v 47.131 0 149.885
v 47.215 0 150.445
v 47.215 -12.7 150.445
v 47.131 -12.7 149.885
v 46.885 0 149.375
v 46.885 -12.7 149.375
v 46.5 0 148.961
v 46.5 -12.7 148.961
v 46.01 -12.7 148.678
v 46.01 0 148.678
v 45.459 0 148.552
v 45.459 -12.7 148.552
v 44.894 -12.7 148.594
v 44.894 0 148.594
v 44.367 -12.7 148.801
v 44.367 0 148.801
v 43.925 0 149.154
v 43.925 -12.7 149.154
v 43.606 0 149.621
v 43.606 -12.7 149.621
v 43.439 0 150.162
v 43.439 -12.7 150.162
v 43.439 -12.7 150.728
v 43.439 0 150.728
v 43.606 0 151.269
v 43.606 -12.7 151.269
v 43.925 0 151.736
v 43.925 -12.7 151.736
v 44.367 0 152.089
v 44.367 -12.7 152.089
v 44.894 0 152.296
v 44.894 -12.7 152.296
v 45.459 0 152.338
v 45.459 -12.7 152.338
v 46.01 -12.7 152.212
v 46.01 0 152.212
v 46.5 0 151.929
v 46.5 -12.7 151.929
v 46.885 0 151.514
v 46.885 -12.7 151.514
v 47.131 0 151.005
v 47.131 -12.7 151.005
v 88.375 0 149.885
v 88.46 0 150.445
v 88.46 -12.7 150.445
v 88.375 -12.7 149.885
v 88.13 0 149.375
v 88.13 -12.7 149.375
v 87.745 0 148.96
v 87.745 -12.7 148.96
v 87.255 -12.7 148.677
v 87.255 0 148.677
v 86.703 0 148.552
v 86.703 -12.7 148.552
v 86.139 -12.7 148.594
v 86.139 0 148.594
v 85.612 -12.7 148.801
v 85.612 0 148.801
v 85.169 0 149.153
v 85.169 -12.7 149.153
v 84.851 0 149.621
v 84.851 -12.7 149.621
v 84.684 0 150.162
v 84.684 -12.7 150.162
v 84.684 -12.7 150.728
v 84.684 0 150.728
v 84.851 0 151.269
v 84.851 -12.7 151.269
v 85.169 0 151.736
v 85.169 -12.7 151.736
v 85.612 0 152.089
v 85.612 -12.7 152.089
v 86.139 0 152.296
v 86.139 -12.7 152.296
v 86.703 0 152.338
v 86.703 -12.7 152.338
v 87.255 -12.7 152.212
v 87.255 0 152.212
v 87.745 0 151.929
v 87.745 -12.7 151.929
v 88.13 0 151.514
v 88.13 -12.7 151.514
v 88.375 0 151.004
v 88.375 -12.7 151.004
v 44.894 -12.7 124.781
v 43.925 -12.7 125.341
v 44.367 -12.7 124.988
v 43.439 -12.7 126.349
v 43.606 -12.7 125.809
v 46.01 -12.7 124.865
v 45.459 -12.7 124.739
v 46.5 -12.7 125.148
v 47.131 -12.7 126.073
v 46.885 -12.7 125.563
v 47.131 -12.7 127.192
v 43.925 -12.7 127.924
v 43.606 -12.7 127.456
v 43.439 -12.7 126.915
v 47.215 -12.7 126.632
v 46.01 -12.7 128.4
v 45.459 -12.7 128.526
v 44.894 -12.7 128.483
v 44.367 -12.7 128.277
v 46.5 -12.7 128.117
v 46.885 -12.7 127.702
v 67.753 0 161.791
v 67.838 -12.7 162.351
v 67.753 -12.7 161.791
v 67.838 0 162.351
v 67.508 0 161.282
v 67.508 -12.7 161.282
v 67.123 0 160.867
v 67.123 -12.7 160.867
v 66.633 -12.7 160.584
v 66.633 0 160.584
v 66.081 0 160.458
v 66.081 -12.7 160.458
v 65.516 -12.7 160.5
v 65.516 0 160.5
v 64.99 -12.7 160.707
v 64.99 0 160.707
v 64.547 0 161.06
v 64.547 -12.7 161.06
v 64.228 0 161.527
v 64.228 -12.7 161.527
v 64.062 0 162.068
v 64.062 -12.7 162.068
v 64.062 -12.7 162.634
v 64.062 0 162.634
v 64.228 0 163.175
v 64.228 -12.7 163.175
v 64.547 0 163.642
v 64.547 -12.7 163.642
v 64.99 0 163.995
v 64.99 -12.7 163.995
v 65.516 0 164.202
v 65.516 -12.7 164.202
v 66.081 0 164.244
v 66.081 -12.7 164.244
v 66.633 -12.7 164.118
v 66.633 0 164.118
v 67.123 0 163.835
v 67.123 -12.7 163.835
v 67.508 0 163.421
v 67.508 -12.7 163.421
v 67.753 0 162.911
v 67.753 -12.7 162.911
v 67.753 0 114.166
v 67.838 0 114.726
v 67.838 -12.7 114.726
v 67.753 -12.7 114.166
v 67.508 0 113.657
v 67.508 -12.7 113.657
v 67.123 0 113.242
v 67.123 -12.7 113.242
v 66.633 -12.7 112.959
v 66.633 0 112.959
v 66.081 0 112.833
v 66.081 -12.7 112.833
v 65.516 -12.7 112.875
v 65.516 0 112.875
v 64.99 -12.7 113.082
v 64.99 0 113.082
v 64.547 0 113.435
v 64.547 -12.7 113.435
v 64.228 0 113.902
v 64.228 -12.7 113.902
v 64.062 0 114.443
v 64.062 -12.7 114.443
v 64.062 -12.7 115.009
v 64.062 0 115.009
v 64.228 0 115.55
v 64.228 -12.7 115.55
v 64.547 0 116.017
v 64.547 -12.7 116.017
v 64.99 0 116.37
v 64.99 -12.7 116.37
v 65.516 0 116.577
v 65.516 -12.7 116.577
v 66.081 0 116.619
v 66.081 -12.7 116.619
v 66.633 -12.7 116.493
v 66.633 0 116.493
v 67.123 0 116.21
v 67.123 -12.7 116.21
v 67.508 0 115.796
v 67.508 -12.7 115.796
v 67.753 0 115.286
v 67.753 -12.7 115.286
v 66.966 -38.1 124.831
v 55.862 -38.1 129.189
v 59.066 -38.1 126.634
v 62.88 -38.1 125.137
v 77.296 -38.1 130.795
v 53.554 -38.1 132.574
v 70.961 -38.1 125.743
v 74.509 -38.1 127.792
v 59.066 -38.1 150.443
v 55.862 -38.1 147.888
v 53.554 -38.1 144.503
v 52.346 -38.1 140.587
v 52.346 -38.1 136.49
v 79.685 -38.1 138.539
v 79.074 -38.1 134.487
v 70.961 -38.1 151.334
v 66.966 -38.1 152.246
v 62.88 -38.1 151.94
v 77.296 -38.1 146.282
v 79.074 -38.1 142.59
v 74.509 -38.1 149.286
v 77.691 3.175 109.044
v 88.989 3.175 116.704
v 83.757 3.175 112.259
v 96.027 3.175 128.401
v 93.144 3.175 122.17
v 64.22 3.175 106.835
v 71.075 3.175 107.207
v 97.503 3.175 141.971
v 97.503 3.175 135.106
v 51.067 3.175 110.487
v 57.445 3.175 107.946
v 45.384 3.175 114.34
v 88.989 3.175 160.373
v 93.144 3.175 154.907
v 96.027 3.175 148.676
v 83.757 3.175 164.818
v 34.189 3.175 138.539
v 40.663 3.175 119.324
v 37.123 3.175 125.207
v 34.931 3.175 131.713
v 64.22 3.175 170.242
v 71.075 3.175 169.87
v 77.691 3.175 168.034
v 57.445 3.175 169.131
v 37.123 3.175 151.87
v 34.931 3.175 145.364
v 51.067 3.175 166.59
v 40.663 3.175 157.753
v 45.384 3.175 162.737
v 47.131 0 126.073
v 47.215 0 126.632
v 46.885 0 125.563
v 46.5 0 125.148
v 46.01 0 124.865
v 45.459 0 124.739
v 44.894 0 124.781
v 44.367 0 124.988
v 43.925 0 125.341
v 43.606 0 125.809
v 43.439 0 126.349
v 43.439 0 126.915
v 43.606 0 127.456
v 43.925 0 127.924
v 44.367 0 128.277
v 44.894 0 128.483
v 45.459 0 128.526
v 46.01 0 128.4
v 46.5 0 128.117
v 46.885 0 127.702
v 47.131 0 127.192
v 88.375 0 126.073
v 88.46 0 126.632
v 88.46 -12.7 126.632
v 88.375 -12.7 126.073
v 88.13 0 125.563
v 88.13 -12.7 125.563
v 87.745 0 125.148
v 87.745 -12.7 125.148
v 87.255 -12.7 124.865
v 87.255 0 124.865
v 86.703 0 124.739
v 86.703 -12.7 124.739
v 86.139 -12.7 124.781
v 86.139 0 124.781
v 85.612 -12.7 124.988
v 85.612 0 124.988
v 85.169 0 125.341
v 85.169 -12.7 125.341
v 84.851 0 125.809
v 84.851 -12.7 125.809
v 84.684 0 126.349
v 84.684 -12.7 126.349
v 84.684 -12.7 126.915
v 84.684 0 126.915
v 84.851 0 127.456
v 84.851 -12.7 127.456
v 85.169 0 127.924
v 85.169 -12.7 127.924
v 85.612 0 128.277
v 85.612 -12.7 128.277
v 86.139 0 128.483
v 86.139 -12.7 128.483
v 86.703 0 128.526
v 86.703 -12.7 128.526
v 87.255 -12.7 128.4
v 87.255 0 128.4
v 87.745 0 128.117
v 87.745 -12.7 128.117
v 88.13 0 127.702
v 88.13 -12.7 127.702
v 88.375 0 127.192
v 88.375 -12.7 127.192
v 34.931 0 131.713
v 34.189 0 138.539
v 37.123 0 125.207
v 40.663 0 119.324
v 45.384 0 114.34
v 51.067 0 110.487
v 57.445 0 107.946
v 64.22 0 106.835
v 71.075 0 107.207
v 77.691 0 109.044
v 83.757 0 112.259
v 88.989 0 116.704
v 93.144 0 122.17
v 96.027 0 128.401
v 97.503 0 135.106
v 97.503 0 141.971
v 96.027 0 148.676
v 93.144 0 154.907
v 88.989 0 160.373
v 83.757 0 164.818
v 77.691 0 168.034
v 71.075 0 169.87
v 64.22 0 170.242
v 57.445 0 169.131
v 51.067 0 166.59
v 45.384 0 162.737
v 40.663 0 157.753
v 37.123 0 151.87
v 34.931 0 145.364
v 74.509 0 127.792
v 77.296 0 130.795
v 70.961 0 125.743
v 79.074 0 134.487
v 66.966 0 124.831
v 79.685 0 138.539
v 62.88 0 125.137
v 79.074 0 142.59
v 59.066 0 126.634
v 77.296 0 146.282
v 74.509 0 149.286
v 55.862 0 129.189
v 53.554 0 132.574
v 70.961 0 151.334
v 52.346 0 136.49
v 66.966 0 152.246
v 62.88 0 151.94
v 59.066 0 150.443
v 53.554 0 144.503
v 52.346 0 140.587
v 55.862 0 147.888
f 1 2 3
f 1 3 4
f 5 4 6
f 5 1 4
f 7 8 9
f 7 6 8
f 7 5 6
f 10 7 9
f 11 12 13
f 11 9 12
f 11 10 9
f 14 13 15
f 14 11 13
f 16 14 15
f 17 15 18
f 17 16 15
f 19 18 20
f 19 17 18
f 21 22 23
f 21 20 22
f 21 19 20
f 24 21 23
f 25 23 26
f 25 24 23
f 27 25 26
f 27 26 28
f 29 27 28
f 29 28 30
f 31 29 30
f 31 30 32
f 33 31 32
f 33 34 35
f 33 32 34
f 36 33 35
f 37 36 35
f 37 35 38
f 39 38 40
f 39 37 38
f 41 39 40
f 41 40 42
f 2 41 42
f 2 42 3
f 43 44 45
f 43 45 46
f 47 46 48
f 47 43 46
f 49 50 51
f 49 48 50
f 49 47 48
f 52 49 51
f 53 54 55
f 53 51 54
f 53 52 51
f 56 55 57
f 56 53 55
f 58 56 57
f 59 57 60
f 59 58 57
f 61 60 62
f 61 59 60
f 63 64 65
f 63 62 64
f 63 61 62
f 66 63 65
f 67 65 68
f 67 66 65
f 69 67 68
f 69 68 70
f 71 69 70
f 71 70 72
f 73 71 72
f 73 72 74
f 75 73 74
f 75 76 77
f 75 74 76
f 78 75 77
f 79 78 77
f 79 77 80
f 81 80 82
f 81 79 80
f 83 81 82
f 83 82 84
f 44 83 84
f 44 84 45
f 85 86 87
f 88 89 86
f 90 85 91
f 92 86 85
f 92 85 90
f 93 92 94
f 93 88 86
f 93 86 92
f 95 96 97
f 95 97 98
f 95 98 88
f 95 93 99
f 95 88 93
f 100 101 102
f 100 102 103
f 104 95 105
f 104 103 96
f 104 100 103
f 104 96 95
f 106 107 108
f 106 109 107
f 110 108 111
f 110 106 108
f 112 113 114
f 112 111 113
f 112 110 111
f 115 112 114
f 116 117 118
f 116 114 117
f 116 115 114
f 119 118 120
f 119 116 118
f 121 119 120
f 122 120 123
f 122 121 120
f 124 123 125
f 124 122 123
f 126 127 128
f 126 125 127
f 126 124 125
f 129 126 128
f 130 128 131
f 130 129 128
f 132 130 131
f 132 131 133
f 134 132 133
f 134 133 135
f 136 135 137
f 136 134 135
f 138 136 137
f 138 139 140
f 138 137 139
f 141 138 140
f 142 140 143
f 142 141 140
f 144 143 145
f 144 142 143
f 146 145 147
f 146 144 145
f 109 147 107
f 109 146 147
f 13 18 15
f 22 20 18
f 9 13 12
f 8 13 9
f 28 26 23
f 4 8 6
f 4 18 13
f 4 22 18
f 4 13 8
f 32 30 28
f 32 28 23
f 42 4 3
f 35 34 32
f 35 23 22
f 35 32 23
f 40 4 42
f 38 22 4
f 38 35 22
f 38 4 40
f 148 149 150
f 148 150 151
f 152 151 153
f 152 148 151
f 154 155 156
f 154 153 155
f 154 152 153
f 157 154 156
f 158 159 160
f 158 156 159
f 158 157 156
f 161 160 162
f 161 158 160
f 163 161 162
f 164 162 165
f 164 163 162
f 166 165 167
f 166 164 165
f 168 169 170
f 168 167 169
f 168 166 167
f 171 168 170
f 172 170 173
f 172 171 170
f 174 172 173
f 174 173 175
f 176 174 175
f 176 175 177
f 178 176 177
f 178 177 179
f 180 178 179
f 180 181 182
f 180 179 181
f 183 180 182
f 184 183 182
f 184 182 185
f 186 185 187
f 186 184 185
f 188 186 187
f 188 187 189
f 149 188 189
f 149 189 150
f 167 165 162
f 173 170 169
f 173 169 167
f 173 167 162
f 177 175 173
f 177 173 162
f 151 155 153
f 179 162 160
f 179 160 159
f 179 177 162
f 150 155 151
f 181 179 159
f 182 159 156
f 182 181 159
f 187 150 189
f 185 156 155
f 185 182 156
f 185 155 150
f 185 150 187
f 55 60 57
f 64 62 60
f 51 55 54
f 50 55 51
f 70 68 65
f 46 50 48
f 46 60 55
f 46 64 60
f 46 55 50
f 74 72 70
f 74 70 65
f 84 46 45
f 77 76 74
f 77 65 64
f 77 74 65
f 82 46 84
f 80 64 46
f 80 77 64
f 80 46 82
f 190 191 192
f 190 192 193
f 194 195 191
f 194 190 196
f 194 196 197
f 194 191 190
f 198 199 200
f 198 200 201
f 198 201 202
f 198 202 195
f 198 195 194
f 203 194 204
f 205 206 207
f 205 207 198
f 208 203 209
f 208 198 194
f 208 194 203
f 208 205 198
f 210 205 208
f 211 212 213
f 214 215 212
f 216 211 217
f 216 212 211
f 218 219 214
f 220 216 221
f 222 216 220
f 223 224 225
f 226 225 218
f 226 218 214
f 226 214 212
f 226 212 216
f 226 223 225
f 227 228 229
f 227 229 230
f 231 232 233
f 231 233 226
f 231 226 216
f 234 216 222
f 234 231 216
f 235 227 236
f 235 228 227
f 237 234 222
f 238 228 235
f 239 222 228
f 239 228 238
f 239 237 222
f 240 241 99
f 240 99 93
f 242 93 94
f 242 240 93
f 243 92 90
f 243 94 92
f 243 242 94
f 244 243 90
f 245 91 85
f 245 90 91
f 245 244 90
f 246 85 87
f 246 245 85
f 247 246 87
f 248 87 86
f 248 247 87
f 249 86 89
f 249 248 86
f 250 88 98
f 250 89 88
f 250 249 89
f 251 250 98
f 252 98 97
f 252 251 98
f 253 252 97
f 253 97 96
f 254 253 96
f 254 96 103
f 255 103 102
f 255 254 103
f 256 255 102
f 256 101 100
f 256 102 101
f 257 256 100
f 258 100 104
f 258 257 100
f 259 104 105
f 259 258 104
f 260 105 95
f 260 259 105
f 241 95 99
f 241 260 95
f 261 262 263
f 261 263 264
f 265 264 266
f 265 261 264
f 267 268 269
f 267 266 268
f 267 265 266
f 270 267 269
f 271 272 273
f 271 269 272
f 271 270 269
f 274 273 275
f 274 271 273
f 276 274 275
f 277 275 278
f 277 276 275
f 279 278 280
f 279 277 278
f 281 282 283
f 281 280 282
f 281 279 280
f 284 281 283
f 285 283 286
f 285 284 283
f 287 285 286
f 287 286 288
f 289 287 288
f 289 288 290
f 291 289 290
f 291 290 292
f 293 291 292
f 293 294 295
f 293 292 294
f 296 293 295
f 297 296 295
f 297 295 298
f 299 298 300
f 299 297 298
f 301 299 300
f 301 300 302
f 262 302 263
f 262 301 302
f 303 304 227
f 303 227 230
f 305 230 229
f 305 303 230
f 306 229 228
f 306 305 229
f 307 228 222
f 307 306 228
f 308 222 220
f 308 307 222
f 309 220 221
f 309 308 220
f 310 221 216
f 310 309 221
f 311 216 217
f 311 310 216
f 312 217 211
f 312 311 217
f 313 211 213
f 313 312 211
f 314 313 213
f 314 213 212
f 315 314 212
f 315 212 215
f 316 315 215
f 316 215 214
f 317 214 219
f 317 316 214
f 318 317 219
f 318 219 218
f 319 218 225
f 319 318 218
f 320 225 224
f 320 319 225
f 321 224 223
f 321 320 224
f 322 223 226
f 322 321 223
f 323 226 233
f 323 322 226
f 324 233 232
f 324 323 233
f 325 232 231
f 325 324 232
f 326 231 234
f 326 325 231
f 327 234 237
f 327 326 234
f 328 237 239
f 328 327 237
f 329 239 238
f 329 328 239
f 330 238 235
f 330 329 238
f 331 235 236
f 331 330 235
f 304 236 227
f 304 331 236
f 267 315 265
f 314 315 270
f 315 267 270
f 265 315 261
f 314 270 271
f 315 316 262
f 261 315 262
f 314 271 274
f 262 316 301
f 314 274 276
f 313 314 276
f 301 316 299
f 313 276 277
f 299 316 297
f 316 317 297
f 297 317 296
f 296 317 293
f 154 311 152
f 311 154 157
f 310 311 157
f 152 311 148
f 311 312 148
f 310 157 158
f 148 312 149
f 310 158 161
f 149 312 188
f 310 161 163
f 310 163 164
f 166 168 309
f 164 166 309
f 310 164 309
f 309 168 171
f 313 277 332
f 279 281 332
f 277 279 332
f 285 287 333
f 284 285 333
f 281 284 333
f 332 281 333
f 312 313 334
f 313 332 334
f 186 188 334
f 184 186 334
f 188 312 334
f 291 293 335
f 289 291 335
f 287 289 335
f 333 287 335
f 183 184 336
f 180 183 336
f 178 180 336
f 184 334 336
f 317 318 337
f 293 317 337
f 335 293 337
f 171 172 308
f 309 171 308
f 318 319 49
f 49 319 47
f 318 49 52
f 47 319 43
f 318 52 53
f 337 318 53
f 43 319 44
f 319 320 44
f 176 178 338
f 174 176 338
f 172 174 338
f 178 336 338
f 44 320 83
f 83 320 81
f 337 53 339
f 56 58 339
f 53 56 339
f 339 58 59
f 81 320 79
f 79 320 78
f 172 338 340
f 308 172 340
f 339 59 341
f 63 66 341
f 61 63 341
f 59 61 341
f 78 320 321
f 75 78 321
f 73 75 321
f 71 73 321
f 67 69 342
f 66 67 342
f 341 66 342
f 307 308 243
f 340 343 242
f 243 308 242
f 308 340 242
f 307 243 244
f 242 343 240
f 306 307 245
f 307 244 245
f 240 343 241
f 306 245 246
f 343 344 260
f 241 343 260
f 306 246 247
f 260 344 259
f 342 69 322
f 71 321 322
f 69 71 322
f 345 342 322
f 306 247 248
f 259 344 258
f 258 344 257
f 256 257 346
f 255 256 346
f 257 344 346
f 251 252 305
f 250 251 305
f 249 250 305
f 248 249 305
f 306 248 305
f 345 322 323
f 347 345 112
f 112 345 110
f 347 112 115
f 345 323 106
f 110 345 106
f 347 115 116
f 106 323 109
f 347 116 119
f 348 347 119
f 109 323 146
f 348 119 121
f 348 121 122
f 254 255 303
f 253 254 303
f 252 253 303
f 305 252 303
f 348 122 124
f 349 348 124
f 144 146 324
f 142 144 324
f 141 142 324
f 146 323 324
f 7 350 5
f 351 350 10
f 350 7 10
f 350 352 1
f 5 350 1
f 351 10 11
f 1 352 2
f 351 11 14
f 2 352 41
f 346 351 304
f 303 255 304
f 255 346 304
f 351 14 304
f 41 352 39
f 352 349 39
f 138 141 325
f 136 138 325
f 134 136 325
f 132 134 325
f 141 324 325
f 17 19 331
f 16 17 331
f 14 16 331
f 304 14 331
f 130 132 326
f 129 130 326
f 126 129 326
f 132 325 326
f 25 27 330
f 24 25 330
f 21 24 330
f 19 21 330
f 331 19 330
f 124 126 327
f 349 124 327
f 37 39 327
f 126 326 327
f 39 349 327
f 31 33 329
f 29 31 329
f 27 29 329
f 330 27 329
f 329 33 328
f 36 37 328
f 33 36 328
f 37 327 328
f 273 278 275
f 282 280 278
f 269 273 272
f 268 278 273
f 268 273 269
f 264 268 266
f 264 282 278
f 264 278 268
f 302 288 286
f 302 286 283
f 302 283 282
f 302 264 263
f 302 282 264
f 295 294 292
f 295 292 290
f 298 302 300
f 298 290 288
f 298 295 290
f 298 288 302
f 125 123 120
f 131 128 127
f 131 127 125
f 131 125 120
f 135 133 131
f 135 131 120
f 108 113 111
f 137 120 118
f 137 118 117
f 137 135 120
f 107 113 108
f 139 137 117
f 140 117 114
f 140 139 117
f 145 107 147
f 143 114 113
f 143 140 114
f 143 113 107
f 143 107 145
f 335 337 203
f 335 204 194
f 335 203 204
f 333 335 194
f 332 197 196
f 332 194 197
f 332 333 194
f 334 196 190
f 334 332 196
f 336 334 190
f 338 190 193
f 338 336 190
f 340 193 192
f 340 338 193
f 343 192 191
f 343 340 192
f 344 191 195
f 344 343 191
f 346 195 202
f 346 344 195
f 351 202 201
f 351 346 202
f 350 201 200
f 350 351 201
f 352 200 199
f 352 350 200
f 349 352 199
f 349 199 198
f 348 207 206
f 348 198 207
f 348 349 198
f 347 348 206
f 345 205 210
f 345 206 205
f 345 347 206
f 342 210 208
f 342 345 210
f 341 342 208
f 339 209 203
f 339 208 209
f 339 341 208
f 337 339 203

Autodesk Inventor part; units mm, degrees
ref_plane "YZ Plane" through (0, 0, 0) normal (1, 0, 0) x (0, 1, 0)
ref_plane "XZ Plane" through (0, 0, 0) normal (0, 1, 0) x (-1, 0, 0)
ref_plane "XY Plane" through (0, 0, 0) normal (0, 0, 1) x (1, 0, 0)
sketch "Sketch1" plane through (0, 0, 0) normal (0, 1, 0) x (-1, 0, 0)
  circle A0 centre (-65.9389, 138.5386) radius 14 projected
  circle A1 centre (-65.9389, 138.5386) radius 13.746
  circle A2 centre (-65.9389, 138.5386) radius 31.75
  point P0 (0, 0)
  dimension "d0" = 27.492
  dimension "d1" = 28
  dimension "d2" = 63.5
extrude "Extrusion1" add sketch "Sketch1" along normal blind 3.175 contours A0 | A1 | A2
sketch "Sketch2" plane through (65.9389, 0, 138.5386) normal (0, -1, 0) x (1, 0, 0)
  circle A0 centre (0, 0) radius 13.746
  point P0 (-65.9389, -138.5386)
  dimension "d5" = 27.492
extrude "Extrusion2" add sketch "Sketch2" along normal blind 38.1
sketch "Sketch3" plane through (65.9389, 0, 138.5386) normal (0, -1, 0) x (1, 0, 0)
  circle A0 centre (0, 23.8125) radius 2.1526 projected
  circle A1 centre (20.6222, 11.9062) radius 2.1526 projected
  circle A2 centre (20.6222, -11.9063) radius 2.1526 projected
  circle A3 centre (0, -23.8125) radius 2.1526 projected
  circle A4 centre (-20.6222, -11.9062) radius 2.1526 projected
  circle A5 centre (-20.6222, 11.9063) radius 2.1526 projected
  circle A6 centre (0, 23.8125) radius 1.8986
  circle A7 centre (20.6222, 11.9062) radius 1.8986
  circle A8 centre (20.6222, -11.9063) radius 1.8986
  circle A9 centre (-20.6222, -11.9062) radius 1.8986
  circle A10 centre (-20.6222, 11.9063) radius 1.8986
  circle A11 centre (0, -23.8125) radius 1.8986
  point P0 (-65.9389, -138.5386)
  dimension "d8" = 4.3053
  dimension "d9" = 3.7973
  dimension "d10" = 3.7973
  dimension "d11" = 3.7973
  dimension "d12" = 3.7973
  dimension "d13" = 3.7973
  dimension "d14" = 3.7973
extrude "Extrusion3" add sketch "Sketch3" along normal blind 12.7 contours A6 | A7 | A8 | A9 | A10 | A11
properties part number "5inCompliantWheelHub"
